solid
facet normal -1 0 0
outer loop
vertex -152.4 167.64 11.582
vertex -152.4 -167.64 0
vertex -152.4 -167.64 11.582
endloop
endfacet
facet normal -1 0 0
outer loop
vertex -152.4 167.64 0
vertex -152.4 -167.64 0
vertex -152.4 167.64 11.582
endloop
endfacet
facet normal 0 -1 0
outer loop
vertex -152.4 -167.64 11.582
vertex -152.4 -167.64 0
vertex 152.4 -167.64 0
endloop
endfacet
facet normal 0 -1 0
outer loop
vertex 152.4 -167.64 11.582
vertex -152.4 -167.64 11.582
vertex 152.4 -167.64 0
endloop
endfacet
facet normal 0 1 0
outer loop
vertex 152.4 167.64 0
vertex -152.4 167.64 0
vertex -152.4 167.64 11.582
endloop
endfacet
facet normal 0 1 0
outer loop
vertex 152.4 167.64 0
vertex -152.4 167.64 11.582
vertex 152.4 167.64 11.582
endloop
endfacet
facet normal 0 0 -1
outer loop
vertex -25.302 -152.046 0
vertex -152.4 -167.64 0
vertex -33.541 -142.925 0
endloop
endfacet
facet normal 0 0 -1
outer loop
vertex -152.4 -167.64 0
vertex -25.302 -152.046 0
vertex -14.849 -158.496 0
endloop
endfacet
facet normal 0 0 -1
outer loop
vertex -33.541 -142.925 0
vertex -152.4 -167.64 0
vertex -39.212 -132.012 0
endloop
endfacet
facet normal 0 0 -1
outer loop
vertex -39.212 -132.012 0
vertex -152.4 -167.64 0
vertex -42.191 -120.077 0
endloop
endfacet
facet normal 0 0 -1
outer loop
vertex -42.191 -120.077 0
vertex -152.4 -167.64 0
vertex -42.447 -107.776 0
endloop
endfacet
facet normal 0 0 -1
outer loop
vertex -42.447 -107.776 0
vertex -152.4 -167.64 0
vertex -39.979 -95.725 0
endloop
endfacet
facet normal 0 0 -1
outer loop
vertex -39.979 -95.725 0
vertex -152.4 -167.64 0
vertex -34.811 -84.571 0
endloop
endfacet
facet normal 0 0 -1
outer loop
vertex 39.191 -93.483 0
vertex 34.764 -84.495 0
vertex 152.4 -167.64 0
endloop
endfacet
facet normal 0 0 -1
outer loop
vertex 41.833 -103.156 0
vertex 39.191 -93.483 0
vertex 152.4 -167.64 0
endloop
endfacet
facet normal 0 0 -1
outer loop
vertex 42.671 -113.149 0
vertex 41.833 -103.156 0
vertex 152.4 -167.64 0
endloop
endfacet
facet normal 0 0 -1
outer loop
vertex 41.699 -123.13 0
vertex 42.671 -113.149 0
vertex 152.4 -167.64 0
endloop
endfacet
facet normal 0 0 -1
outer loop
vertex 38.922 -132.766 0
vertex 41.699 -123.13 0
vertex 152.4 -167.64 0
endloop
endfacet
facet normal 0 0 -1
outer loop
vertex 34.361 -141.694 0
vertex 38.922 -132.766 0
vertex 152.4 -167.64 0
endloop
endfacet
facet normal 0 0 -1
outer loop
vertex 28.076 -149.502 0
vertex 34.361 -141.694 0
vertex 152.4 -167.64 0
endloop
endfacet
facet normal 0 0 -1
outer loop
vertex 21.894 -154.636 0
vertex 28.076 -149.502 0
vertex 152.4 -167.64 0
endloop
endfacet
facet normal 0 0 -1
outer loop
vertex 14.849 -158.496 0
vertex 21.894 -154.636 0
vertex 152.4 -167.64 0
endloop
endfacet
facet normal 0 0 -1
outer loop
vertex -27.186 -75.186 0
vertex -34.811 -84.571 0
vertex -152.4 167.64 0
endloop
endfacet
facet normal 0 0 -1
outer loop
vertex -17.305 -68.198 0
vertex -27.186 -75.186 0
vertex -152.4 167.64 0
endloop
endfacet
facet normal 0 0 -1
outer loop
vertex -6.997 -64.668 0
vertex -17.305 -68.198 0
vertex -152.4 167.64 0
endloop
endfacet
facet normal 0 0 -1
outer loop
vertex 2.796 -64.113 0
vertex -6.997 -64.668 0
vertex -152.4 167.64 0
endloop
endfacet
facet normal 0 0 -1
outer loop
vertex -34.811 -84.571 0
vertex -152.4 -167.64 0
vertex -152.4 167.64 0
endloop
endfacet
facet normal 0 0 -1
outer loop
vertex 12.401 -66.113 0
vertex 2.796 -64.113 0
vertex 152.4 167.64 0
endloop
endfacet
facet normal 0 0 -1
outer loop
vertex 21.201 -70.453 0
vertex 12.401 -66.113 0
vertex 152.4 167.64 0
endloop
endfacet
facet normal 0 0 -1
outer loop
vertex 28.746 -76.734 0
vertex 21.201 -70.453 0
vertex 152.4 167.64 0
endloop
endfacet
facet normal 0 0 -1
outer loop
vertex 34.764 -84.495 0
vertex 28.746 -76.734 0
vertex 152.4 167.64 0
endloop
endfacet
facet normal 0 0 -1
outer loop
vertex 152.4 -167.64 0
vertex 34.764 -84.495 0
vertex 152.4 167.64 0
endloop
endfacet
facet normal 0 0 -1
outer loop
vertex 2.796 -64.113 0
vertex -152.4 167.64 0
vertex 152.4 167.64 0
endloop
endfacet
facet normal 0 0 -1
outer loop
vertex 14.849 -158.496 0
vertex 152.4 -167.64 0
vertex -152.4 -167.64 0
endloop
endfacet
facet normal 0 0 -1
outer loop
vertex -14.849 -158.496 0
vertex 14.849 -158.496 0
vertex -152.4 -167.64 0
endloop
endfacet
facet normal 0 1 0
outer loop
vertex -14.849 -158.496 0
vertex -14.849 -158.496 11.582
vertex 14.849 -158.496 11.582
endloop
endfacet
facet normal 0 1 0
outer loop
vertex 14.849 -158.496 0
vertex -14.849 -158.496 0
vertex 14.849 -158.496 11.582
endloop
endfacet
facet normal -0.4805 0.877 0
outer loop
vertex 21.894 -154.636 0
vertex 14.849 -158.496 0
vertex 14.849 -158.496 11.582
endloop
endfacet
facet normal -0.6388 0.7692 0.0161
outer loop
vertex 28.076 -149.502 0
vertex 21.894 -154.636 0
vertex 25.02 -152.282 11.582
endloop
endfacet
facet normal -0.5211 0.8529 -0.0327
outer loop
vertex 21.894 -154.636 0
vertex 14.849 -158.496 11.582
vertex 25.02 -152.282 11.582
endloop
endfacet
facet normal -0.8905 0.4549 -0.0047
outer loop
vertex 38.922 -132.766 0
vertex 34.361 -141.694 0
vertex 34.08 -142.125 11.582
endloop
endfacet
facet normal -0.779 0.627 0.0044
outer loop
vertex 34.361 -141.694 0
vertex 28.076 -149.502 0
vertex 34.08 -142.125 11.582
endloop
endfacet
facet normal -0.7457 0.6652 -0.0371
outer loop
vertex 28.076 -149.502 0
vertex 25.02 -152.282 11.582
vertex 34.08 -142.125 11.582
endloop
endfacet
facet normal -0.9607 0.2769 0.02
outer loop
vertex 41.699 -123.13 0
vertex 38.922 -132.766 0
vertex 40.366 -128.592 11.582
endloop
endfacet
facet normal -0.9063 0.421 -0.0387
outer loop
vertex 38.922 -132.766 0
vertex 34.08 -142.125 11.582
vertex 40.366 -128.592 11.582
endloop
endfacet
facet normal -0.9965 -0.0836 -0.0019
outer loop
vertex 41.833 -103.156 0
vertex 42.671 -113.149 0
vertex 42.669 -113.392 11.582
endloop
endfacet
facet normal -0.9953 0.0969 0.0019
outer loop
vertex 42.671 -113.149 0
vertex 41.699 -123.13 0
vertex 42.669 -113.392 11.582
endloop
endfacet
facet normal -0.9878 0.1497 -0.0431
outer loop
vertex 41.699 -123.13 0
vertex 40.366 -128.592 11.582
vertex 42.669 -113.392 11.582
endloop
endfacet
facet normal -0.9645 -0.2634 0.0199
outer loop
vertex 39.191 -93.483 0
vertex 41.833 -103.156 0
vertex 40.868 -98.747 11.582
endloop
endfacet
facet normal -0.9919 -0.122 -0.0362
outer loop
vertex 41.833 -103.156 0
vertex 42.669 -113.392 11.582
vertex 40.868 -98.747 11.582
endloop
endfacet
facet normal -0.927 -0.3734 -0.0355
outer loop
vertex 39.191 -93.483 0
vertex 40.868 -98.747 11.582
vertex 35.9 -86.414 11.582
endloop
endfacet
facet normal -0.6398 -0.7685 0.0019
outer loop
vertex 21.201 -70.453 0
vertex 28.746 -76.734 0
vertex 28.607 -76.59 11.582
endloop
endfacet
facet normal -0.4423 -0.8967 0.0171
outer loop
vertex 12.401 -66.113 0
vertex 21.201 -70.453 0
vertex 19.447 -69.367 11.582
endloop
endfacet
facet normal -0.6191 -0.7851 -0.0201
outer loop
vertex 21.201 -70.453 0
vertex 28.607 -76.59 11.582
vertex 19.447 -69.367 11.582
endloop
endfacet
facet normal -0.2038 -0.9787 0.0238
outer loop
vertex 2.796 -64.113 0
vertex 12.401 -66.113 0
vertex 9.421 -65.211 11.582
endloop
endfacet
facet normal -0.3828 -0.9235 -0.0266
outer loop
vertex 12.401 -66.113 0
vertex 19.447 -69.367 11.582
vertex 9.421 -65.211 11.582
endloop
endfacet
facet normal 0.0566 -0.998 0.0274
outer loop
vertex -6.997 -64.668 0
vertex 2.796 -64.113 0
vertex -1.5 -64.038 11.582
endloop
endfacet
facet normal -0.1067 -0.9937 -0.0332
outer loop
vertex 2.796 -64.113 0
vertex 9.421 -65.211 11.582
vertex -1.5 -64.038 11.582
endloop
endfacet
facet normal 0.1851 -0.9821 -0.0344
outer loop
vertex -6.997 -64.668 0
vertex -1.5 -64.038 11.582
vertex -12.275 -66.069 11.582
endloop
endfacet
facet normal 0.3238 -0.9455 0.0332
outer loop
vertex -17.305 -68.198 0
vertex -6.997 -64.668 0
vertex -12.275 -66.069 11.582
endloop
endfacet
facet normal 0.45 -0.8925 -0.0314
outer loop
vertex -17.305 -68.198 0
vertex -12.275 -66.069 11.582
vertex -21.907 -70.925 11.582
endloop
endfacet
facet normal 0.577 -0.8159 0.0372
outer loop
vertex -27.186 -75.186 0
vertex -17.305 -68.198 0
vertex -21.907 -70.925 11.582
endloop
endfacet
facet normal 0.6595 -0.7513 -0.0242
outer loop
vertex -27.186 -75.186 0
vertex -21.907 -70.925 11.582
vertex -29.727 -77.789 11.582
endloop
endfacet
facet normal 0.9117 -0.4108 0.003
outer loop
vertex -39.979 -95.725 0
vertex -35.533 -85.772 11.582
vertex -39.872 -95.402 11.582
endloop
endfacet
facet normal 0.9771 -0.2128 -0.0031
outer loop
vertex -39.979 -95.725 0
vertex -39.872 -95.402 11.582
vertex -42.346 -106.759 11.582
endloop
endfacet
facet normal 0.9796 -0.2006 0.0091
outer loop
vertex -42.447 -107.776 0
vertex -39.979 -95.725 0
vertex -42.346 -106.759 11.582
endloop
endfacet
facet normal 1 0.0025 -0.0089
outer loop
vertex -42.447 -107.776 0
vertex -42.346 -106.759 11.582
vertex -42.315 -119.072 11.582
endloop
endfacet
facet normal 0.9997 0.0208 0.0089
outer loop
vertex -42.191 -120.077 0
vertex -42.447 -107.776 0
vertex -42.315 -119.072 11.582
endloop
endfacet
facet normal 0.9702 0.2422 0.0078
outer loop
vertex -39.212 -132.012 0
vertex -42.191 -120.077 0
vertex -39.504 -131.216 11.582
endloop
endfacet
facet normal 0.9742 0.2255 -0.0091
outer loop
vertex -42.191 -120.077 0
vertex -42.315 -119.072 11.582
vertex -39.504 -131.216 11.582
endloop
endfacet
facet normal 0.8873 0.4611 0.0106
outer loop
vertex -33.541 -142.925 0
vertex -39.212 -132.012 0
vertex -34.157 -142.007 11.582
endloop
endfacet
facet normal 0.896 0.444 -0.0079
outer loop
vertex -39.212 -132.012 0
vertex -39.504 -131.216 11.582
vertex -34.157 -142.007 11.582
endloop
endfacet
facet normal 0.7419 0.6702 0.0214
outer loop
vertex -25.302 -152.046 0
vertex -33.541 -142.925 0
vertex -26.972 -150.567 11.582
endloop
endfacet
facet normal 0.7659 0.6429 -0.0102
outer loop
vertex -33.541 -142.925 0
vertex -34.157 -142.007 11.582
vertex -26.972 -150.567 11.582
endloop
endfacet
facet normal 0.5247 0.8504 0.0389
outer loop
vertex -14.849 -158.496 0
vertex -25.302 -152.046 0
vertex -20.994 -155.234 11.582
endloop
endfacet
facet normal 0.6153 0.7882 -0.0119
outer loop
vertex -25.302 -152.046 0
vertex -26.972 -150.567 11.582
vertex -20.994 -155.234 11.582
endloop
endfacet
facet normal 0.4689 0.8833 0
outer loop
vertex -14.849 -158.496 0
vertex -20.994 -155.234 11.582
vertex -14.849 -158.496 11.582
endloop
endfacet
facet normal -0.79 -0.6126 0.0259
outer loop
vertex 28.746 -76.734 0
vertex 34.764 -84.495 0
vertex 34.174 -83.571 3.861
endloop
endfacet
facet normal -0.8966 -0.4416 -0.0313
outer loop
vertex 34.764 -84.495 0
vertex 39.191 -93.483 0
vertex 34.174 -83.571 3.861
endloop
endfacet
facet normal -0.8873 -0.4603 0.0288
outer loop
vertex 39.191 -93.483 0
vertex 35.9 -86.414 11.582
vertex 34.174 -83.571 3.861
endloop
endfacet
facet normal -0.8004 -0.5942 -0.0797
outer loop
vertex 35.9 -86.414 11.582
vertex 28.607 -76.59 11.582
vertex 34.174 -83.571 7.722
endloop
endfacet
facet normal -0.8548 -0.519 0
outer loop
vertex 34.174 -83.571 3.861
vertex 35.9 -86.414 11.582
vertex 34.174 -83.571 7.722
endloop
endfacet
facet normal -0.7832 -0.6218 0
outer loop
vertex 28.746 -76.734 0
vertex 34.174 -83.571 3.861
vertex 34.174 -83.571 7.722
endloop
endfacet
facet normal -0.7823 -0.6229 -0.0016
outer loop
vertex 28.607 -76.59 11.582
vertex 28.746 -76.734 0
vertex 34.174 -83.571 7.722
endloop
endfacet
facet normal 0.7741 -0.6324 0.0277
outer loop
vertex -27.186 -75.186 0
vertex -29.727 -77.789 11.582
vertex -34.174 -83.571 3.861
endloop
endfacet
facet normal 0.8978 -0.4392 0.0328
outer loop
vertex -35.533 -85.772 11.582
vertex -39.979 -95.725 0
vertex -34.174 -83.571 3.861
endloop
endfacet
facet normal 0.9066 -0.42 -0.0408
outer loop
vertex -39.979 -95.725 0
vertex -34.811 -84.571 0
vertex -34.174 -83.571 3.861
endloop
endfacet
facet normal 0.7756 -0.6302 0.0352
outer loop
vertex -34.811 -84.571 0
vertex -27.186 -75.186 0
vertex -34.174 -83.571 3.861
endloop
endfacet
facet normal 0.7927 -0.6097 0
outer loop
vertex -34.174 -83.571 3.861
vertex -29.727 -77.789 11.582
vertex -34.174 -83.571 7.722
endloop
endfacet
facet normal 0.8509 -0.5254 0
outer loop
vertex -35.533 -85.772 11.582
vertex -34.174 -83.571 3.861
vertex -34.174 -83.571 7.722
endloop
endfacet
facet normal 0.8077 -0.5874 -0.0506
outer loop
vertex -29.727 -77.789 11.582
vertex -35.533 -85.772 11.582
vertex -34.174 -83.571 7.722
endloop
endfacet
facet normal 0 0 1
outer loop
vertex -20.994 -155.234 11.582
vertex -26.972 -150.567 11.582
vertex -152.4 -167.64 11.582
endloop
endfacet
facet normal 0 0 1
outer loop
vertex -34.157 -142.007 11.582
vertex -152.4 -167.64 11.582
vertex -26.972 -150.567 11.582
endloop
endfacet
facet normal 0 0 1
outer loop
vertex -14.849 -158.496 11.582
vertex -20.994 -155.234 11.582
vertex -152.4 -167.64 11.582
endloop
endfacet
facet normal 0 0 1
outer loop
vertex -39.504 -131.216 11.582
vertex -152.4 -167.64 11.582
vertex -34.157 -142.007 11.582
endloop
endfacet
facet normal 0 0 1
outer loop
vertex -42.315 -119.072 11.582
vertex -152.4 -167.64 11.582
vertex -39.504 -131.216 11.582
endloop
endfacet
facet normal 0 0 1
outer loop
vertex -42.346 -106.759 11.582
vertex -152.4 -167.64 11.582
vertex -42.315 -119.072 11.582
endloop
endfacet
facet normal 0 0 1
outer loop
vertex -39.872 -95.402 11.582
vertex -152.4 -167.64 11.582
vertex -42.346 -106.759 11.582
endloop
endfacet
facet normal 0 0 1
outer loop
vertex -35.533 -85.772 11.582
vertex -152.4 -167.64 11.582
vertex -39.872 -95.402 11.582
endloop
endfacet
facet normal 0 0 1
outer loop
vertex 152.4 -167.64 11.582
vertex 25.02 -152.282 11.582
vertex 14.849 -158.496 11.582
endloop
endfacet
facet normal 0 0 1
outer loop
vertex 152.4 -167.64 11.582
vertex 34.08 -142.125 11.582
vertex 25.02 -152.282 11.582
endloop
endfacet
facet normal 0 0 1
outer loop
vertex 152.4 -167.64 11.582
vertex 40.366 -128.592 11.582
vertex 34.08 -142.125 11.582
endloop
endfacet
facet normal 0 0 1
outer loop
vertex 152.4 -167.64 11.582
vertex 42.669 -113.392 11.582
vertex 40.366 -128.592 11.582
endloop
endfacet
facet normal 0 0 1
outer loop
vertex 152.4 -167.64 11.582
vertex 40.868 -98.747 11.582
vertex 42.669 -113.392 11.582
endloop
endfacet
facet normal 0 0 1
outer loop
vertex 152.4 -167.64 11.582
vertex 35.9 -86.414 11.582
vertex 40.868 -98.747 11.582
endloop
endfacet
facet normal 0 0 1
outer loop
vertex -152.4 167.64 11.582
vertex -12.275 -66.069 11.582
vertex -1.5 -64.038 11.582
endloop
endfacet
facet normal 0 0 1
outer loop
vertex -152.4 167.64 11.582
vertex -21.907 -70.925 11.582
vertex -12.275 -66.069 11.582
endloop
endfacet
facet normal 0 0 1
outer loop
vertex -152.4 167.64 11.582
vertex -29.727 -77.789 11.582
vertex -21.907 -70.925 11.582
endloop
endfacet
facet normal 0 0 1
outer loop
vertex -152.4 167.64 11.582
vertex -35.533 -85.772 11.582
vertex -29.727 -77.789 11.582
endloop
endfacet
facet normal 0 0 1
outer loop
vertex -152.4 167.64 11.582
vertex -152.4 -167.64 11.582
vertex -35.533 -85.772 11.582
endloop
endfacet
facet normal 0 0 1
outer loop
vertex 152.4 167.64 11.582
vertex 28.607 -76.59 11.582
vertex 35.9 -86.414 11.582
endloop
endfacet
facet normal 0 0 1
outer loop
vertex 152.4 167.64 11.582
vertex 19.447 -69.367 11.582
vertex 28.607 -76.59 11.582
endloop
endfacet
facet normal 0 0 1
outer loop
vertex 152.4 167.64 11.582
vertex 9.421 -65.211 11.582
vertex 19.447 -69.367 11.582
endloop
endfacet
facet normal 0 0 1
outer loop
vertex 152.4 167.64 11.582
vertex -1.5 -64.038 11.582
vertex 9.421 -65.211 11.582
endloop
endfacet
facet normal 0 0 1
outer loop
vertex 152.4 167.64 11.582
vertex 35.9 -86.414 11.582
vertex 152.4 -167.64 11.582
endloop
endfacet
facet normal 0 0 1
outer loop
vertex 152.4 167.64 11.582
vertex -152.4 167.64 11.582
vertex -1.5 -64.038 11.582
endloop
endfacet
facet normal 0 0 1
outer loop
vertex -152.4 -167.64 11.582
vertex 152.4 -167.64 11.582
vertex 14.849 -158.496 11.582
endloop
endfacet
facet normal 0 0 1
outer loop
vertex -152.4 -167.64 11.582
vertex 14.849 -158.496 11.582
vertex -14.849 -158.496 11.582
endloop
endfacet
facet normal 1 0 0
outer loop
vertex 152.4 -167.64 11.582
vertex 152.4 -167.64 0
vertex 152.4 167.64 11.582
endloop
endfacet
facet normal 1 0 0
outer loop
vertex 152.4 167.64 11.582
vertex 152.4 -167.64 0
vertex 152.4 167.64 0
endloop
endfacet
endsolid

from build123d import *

# Parameters (mm, degrees)
F0_W     = 304.8
F0_H     = 335.28
F1_DEPTH = 11.5824
F3_DEPTH = 11.5834


with BuildPart() as f1:
    # F0 (on Top) → F1 (new body)
    with BuildSketch(Plane.XY):
        Rectangle(F0_W, F0_H)
    extrude(amount=F1_DEPTH)

    # F2 (on face) → F3 (cut, through all)
    with BuildSketch(Plane.XY.offset(11.5824)):
        with BuildLine():
            Line((-14.8492275557, -158.496), (14.8492275557, -158.496))
            add(Edge.make_bspline(
                [(14.8492275557, -158.496), (68.3482837309, -135.801132311), (34.1741418655, -83.5709657846), (0, -31.3407992582), (-34.1741418655, -83.5709657846), (-68.3482837309, -135.801132311), (-14.8492275557, -158.496)],
                knots=[3.4970138553, 3.4970138553, 3.4970138553, 5.3544614899, 5.3544614899, 7.2119091245, 7.2119091245, 9.0693567591, 9.0693567591, 9.0693567591], degree=2, weights=[1, 0.5988565087, 1, 0.5988565087, 1, 0.5988565087, 1]))
        make_face()
    extrude(amount=-F3_DEPTH, mode=Mode.SUBTRACT)


solid = f1.part
